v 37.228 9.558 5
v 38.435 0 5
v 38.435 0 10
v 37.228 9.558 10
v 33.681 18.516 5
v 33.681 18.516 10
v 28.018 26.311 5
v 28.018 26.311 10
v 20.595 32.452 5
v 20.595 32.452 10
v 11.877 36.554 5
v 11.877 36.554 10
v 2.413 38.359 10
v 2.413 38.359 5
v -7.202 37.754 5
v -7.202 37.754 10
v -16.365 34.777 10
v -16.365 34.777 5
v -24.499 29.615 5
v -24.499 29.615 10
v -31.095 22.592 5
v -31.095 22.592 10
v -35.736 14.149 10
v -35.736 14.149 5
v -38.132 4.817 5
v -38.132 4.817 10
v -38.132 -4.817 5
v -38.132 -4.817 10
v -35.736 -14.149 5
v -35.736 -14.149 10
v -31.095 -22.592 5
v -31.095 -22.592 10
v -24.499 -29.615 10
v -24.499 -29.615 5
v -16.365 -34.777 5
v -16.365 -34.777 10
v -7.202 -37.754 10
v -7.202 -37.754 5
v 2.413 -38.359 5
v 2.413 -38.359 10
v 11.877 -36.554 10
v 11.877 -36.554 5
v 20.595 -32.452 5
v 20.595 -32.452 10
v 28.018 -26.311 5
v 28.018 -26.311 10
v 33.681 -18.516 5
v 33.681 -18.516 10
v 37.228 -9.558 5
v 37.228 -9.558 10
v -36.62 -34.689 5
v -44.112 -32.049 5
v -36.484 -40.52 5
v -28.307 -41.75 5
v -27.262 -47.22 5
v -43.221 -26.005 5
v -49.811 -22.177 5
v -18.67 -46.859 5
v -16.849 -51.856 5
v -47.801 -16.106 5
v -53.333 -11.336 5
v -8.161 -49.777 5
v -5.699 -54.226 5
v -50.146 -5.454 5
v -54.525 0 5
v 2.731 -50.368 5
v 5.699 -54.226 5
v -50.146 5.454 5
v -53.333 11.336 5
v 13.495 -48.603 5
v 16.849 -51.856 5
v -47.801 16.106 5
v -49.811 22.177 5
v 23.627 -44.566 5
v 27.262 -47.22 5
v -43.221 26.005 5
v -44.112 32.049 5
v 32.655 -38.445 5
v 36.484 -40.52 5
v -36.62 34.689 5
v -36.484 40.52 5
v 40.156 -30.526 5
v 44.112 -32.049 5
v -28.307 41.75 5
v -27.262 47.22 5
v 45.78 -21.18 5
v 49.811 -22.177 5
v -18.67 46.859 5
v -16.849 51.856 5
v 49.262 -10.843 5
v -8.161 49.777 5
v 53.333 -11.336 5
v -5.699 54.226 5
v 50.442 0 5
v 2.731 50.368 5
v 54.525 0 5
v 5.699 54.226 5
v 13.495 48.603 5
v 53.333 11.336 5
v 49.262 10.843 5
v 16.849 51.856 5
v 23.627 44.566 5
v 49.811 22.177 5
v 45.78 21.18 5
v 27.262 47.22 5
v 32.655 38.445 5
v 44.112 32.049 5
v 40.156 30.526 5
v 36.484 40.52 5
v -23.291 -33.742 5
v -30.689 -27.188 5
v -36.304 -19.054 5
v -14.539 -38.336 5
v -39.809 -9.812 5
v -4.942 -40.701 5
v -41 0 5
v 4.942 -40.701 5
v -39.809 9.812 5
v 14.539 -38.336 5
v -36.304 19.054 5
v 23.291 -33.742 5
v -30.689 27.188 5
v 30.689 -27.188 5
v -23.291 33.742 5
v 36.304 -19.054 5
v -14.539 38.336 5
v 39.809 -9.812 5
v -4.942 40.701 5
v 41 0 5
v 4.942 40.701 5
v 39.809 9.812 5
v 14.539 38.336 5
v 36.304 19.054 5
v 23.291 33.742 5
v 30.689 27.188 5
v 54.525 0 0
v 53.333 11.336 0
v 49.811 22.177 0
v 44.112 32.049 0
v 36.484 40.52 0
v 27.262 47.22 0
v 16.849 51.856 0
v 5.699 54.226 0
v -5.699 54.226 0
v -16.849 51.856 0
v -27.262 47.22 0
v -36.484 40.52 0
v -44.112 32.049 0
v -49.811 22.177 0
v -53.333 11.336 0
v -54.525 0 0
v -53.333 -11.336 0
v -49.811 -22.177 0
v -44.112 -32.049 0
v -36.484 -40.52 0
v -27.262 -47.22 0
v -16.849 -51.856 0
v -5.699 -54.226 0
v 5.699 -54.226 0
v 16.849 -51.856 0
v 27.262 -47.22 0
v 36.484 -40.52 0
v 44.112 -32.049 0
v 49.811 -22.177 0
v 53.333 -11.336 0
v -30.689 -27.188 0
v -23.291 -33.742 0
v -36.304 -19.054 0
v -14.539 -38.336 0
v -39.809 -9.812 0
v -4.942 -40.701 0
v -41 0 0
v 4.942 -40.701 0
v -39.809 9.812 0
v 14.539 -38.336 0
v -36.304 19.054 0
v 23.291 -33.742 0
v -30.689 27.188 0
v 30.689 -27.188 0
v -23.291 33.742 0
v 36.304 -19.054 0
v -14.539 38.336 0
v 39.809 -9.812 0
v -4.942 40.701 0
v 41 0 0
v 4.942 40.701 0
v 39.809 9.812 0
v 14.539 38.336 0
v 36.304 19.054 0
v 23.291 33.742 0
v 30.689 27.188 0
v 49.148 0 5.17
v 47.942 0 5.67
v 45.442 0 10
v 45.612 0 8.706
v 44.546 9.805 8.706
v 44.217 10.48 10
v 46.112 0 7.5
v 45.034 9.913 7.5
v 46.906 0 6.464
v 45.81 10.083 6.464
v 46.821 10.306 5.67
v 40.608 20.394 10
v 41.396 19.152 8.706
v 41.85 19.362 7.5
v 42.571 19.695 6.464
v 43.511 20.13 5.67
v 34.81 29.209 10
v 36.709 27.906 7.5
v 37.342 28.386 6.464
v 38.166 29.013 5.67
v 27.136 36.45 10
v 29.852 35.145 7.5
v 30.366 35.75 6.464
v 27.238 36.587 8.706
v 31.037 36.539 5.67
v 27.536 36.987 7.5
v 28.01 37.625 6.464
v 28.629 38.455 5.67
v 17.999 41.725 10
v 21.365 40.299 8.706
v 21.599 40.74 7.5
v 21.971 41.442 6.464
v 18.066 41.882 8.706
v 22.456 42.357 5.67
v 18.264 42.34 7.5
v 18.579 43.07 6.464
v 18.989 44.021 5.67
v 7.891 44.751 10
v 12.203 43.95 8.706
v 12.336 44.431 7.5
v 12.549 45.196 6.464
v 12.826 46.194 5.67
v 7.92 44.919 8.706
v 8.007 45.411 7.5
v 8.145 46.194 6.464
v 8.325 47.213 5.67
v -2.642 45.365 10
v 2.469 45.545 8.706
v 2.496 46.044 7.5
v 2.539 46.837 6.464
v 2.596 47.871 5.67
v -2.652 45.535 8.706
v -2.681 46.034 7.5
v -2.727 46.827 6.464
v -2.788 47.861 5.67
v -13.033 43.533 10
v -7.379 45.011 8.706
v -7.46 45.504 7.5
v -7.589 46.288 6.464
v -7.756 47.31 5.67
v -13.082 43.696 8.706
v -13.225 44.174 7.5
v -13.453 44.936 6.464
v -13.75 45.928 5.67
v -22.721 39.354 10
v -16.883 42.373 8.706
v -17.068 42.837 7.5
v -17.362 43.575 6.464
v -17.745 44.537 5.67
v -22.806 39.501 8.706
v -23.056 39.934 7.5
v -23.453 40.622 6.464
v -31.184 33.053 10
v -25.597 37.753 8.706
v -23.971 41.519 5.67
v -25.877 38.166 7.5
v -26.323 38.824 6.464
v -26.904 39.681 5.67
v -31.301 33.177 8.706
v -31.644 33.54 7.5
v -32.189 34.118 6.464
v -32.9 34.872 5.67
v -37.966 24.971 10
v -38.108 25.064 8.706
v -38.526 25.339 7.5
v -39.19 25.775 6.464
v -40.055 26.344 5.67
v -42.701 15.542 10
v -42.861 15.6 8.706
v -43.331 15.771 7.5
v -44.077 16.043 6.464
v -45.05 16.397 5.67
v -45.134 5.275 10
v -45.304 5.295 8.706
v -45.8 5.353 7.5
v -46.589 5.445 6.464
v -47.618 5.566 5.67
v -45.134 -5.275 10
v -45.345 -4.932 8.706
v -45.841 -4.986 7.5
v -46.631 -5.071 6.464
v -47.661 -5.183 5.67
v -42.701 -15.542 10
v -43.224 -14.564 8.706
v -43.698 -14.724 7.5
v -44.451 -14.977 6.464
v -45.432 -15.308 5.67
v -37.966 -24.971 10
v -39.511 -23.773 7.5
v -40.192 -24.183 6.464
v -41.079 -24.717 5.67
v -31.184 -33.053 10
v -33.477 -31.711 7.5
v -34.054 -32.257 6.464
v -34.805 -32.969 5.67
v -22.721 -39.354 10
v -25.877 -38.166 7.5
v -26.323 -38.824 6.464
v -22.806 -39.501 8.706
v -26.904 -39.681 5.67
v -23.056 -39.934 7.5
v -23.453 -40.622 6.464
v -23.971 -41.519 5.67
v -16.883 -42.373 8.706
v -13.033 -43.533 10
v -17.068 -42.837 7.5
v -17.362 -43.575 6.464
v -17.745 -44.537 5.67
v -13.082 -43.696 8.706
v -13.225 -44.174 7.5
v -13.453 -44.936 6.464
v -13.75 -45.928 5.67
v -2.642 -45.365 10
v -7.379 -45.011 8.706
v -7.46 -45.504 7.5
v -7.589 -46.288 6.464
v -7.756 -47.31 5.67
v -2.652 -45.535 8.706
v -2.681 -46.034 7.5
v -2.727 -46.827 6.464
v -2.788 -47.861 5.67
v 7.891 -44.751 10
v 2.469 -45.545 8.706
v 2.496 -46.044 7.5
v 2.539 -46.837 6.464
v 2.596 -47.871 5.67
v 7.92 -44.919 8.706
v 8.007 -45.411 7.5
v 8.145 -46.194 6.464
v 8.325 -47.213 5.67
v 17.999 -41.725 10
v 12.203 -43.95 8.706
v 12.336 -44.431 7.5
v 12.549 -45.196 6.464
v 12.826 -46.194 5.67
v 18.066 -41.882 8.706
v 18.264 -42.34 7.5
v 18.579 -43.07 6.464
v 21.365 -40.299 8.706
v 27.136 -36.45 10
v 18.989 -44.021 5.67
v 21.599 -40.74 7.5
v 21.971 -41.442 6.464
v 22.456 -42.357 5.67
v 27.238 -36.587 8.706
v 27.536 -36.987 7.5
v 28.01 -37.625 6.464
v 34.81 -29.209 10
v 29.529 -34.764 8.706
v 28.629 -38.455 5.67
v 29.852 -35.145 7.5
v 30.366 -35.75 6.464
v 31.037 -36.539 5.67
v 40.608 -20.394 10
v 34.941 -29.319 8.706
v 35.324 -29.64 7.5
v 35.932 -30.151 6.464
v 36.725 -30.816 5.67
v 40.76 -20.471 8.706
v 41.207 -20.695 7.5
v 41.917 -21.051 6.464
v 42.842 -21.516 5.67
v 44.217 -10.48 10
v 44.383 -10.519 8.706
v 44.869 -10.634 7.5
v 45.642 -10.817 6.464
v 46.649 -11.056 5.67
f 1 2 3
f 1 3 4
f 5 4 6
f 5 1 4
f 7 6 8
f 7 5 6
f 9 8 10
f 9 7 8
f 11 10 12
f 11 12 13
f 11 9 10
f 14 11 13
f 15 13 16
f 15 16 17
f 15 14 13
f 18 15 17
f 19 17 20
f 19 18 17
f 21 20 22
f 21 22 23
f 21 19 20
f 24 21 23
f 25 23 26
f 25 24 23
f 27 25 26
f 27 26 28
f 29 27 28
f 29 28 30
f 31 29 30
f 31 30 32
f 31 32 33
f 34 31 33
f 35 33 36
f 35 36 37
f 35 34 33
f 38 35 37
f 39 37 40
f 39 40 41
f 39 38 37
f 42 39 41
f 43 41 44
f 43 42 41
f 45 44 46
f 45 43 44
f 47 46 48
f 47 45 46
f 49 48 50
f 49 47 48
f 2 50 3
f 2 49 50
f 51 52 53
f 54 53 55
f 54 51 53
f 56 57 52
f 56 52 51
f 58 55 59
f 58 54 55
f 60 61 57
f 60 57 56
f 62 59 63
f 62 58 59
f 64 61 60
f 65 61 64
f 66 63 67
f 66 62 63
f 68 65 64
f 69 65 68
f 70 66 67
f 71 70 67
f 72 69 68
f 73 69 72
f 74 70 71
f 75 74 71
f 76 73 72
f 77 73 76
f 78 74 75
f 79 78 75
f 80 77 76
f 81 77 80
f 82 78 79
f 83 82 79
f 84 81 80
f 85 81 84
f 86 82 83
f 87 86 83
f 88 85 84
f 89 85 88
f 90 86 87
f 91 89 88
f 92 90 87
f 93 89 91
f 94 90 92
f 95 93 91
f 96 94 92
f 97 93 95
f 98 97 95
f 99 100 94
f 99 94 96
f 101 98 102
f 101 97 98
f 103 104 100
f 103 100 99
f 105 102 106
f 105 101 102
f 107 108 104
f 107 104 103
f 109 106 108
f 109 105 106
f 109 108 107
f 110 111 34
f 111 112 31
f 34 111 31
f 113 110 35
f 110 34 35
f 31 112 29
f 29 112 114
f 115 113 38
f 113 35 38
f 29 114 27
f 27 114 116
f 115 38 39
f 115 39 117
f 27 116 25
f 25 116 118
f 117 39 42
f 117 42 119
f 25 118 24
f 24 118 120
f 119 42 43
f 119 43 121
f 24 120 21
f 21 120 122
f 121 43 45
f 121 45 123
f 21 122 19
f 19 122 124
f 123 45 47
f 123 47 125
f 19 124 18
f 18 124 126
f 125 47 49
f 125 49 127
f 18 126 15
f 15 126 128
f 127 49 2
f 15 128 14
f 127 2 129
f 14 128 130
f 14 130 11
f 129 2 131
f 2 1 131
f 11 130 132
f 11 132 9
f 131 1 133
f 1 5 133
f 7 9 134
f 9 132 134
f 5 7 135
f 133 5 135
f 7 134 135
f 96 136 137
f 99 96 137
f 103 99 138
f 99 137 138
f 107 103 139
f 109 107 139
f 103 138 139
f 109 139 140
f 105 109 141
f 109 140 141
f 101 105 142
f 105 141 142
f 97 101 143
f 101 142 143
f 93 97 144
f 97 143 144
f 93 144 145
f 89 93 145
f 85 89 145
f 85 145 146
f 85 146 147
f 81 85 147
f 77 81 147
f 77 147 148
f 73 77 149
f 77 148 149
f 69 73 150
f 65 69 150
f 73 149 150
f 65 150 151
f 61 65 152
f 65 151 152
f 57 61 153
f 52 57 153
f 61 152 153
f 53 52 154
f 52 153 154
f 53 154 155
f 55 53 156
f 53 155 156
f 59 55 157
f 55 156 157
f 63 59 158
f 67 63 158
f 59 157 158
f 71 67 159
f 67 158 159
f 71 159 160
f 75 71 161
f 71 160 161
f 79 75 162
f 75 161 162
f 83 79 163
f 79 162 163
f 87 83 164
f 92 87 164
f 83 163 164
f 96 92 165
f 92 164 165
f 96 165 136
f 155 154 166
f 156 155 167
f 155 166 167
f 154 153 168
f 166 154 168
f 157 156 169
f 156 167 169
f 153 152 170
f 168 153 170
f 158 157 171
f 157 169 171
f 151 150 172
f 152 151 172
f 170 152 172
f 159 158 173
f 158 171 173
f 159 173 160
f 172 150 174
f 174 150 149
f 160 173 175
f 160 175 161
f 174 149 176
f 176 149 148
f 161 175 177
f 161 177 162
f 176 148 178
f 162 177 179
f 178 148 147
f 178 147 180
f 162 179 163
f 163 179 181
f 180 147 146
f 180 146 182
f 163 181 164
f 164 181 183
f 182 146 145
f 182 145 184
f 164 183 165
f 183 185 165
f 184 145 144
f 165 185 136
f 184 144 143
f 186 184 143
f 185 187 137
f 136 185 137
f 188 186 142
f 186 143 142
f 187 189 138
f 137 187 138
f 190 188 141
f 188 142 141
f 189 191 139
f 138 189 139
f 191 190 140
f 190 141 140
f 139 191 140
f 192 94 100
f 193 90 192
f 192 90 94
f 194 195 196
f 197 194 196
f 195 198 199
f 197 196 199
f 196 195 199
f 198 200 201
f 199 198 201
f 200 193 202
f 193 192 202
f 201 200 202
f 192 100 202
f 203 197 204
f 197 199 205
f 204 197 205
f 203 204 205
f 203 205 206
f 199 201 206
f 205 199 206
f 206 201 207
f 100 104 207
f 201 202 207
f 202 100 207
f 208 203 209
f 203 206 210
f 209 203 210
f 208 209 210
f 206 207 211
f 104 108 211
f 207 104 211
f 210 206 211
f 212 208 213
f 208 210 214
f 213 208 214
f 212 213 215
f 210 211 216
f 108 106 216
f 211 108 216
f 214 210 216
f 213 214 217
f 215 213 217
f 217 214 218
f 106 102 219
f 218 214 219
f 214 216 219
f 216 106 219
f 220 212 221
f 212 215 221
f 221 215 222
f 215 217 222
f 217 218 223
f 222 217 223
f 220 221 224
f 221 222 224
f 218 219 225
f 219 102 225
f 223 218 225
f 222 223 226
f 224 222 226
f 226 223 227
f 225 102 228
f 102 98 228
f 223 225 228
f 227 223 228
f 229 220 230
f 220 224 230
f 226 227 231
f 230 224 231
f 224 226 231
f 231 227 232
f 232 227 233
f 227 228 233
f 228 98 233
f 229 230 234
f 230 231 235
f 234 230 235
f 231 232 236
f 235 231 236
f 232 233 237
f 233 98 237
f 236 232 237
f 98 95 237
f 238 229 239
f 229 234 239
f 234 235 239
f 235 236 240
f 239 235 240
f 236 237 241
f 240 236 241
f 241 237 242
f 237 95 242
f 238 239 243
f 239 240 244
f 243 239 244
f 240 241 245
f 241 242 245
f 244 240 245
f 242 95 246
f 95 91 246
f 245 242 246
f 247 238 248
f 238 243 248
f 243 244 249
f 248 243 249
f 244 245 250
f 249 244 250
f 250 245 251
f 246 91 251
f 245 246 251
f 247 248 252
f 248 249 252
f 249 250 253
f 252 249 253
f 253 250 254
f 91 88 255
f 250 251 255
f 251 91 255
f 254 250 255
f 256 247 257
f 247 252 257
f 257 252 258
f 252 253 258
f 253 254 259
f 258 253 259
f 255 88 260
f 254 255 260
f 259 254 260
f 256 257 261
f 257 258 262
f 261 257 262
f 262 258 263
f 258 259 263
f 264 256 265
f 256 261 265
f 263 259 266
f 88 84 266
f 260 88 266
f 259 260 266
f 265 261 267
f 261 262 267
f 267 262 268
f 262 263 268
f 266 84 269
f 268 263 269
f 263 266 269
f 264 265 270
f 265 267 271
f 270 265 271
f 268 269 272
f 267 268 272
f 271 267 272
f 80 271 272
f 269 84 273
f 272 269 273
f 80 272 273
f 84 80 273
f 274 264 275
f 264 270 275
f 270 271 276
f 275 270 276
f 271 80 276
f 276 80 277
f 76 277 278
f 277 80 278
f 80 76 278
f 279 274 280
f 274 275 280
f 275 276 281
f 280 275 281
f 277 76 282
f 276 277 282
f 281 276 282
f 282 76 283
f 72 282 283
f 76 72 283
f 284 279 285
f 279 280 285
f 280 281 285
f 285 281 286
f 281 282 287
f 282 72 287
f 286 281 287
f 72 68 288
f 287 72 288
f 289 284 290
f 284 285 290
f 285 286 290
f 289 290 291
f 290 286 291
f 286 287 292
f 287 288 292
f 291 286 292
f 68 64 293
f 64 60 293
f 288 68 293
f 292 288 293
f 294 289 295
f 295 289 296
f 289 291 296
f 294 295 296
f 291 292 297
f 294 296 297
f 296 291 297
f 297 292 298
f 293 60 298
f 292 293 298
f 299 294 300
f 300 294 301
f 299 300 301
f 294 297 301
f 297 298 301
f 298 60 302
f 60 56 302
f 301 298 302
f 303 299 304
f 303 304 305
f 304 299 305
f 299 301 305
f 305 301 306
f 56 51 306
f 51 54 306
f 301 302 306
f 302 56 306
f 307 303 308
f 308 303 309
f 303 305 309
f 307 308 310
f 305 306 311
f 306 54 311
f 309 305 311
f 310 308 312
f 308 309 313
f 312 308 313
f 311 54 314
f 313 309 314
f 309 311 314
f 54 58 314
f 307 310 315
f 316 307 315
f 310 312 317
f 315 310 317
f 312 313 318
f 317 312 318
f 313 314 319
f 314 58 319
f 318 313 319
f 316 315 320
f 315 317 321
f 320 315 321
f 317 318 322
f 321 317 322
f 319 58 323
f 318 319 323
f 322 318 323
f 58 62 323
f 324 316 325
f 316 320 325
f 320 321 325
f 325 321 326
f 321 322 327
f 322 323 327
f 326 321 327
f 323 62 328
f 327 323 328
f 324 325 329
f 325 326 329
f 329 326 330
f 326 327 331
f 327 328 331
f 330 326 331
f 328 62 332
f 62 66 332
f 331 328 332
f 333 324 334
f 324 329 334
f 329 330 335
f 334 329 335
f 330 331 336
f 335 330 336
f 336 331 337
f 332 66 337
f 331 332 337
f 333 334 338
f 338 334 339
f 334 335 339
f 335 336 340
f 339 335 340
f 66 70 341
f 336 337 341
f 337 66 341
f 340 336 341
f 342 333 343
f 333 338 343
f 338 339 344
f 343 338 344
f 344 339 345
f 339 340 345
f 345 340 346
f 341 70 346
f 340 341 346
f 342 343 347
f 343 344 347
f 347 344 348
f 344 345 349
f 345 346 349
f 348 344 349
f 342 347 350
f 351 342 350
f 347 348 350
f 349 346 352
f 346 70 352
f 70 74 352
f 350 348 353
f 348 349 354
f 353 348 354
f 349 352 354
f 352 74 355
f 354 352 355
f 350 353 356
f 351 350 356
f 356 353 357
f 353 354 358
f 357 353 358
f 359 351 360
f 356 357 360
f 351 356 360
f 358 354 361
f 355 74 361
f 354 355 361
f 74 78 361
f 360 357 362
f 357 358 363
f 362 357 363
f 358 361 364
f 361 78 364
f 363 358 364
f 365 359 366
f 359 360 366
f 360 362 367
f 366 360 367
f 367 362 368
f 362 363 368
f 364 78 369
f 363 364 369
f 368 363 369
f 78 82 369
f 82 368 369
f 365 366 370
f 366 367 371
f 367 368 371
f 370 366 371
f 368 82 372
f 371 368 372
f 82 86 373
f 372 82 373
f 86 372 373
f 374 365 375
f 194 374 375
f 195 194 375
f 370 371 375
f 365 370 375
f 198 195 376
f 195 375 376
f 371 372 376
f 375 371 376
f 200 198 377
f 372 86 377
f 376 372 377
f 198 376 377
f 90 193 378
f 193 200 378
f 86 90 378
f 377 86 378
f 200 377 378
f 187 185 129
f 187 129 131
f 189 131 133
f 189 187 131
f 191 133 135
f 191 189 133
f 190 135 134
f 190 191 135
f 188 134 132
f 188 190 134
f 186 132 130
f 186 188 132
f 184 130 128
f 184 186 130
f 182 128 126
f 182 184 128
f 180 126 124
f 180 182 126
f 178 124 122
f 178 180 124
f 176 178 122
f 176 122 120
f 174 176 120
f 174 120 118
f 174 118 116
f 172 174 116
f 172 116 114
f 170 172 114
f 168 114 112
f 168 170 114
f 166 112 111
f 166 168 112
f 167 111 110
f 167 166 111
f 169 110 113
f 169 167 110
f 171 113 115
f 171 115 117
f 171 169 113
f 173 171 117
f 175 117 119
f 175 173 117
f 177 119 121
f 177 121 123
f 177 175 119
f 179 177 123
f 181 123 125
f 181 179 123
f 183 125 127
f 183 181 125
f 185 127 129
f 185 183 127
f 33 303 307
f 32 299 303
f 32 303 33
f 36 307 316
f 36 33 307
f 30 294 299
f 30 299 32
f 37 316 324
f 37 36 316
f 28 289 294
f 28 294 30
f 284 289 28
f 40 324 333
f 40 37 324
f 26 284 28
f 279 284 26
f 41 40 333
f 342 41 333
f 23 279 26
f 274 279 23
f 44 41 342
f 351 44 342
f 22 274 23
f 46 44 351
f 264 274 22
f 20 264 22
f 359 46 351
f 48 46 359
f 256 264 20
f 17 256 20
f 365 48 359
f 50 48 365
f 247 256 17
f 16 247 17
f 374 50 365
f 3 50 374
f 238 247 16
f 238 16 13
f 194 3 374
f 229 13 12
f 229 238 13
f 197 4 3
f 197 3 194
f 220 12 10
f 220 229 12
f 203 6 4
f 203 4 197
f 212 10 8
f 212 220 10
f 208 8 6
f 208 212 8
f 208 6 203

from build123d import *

# Parameters (mm, degrees)
SKETCH1_R           = 54.524863565
SKETCH1_R_2         = 41
BOSS_EXTRUDE1_DEPTH = 5
SKETCH2_R           = 45.441734001
SKETCH2_R_2         = 38.435146228
BOSS_EXTRUDE2_DEPTH = 5
FILLET1_R           = 5


with BuildPart() as part:
    # Sketch1 → Boss-Extrude1 (new body)
    with BuildSketch(Plane.XY):
        Circle(SKETCH1_R)
        Circle(SKETCH1_R_2, mode=Mode.SUBTRACT)
    extrude(amount=BOSS_EXTRUDE1_DEPTH)

    # Sketch2 → Boss-Extrude2 (add)
    with BuildSketch(Plane.XY.offset(5)):
        Circle(SKETCH2_R)
        Circle(SKETCH2_R_2, mode=Mode.SUBTRACT)
    extrude(amount=BOSS_EXTRUDE2_DEPTH)

    # Fillet1
    fillet1_edges = [part.edges().sort_by_distance(p)[0] for p in [
        (-45.441734001, 0, 5),
    ]]
    fillet(fillet1_edges, radius=FILLET1_R - 0.0001)  # a hair under: the kernel refuses the full size


solid = part.part
